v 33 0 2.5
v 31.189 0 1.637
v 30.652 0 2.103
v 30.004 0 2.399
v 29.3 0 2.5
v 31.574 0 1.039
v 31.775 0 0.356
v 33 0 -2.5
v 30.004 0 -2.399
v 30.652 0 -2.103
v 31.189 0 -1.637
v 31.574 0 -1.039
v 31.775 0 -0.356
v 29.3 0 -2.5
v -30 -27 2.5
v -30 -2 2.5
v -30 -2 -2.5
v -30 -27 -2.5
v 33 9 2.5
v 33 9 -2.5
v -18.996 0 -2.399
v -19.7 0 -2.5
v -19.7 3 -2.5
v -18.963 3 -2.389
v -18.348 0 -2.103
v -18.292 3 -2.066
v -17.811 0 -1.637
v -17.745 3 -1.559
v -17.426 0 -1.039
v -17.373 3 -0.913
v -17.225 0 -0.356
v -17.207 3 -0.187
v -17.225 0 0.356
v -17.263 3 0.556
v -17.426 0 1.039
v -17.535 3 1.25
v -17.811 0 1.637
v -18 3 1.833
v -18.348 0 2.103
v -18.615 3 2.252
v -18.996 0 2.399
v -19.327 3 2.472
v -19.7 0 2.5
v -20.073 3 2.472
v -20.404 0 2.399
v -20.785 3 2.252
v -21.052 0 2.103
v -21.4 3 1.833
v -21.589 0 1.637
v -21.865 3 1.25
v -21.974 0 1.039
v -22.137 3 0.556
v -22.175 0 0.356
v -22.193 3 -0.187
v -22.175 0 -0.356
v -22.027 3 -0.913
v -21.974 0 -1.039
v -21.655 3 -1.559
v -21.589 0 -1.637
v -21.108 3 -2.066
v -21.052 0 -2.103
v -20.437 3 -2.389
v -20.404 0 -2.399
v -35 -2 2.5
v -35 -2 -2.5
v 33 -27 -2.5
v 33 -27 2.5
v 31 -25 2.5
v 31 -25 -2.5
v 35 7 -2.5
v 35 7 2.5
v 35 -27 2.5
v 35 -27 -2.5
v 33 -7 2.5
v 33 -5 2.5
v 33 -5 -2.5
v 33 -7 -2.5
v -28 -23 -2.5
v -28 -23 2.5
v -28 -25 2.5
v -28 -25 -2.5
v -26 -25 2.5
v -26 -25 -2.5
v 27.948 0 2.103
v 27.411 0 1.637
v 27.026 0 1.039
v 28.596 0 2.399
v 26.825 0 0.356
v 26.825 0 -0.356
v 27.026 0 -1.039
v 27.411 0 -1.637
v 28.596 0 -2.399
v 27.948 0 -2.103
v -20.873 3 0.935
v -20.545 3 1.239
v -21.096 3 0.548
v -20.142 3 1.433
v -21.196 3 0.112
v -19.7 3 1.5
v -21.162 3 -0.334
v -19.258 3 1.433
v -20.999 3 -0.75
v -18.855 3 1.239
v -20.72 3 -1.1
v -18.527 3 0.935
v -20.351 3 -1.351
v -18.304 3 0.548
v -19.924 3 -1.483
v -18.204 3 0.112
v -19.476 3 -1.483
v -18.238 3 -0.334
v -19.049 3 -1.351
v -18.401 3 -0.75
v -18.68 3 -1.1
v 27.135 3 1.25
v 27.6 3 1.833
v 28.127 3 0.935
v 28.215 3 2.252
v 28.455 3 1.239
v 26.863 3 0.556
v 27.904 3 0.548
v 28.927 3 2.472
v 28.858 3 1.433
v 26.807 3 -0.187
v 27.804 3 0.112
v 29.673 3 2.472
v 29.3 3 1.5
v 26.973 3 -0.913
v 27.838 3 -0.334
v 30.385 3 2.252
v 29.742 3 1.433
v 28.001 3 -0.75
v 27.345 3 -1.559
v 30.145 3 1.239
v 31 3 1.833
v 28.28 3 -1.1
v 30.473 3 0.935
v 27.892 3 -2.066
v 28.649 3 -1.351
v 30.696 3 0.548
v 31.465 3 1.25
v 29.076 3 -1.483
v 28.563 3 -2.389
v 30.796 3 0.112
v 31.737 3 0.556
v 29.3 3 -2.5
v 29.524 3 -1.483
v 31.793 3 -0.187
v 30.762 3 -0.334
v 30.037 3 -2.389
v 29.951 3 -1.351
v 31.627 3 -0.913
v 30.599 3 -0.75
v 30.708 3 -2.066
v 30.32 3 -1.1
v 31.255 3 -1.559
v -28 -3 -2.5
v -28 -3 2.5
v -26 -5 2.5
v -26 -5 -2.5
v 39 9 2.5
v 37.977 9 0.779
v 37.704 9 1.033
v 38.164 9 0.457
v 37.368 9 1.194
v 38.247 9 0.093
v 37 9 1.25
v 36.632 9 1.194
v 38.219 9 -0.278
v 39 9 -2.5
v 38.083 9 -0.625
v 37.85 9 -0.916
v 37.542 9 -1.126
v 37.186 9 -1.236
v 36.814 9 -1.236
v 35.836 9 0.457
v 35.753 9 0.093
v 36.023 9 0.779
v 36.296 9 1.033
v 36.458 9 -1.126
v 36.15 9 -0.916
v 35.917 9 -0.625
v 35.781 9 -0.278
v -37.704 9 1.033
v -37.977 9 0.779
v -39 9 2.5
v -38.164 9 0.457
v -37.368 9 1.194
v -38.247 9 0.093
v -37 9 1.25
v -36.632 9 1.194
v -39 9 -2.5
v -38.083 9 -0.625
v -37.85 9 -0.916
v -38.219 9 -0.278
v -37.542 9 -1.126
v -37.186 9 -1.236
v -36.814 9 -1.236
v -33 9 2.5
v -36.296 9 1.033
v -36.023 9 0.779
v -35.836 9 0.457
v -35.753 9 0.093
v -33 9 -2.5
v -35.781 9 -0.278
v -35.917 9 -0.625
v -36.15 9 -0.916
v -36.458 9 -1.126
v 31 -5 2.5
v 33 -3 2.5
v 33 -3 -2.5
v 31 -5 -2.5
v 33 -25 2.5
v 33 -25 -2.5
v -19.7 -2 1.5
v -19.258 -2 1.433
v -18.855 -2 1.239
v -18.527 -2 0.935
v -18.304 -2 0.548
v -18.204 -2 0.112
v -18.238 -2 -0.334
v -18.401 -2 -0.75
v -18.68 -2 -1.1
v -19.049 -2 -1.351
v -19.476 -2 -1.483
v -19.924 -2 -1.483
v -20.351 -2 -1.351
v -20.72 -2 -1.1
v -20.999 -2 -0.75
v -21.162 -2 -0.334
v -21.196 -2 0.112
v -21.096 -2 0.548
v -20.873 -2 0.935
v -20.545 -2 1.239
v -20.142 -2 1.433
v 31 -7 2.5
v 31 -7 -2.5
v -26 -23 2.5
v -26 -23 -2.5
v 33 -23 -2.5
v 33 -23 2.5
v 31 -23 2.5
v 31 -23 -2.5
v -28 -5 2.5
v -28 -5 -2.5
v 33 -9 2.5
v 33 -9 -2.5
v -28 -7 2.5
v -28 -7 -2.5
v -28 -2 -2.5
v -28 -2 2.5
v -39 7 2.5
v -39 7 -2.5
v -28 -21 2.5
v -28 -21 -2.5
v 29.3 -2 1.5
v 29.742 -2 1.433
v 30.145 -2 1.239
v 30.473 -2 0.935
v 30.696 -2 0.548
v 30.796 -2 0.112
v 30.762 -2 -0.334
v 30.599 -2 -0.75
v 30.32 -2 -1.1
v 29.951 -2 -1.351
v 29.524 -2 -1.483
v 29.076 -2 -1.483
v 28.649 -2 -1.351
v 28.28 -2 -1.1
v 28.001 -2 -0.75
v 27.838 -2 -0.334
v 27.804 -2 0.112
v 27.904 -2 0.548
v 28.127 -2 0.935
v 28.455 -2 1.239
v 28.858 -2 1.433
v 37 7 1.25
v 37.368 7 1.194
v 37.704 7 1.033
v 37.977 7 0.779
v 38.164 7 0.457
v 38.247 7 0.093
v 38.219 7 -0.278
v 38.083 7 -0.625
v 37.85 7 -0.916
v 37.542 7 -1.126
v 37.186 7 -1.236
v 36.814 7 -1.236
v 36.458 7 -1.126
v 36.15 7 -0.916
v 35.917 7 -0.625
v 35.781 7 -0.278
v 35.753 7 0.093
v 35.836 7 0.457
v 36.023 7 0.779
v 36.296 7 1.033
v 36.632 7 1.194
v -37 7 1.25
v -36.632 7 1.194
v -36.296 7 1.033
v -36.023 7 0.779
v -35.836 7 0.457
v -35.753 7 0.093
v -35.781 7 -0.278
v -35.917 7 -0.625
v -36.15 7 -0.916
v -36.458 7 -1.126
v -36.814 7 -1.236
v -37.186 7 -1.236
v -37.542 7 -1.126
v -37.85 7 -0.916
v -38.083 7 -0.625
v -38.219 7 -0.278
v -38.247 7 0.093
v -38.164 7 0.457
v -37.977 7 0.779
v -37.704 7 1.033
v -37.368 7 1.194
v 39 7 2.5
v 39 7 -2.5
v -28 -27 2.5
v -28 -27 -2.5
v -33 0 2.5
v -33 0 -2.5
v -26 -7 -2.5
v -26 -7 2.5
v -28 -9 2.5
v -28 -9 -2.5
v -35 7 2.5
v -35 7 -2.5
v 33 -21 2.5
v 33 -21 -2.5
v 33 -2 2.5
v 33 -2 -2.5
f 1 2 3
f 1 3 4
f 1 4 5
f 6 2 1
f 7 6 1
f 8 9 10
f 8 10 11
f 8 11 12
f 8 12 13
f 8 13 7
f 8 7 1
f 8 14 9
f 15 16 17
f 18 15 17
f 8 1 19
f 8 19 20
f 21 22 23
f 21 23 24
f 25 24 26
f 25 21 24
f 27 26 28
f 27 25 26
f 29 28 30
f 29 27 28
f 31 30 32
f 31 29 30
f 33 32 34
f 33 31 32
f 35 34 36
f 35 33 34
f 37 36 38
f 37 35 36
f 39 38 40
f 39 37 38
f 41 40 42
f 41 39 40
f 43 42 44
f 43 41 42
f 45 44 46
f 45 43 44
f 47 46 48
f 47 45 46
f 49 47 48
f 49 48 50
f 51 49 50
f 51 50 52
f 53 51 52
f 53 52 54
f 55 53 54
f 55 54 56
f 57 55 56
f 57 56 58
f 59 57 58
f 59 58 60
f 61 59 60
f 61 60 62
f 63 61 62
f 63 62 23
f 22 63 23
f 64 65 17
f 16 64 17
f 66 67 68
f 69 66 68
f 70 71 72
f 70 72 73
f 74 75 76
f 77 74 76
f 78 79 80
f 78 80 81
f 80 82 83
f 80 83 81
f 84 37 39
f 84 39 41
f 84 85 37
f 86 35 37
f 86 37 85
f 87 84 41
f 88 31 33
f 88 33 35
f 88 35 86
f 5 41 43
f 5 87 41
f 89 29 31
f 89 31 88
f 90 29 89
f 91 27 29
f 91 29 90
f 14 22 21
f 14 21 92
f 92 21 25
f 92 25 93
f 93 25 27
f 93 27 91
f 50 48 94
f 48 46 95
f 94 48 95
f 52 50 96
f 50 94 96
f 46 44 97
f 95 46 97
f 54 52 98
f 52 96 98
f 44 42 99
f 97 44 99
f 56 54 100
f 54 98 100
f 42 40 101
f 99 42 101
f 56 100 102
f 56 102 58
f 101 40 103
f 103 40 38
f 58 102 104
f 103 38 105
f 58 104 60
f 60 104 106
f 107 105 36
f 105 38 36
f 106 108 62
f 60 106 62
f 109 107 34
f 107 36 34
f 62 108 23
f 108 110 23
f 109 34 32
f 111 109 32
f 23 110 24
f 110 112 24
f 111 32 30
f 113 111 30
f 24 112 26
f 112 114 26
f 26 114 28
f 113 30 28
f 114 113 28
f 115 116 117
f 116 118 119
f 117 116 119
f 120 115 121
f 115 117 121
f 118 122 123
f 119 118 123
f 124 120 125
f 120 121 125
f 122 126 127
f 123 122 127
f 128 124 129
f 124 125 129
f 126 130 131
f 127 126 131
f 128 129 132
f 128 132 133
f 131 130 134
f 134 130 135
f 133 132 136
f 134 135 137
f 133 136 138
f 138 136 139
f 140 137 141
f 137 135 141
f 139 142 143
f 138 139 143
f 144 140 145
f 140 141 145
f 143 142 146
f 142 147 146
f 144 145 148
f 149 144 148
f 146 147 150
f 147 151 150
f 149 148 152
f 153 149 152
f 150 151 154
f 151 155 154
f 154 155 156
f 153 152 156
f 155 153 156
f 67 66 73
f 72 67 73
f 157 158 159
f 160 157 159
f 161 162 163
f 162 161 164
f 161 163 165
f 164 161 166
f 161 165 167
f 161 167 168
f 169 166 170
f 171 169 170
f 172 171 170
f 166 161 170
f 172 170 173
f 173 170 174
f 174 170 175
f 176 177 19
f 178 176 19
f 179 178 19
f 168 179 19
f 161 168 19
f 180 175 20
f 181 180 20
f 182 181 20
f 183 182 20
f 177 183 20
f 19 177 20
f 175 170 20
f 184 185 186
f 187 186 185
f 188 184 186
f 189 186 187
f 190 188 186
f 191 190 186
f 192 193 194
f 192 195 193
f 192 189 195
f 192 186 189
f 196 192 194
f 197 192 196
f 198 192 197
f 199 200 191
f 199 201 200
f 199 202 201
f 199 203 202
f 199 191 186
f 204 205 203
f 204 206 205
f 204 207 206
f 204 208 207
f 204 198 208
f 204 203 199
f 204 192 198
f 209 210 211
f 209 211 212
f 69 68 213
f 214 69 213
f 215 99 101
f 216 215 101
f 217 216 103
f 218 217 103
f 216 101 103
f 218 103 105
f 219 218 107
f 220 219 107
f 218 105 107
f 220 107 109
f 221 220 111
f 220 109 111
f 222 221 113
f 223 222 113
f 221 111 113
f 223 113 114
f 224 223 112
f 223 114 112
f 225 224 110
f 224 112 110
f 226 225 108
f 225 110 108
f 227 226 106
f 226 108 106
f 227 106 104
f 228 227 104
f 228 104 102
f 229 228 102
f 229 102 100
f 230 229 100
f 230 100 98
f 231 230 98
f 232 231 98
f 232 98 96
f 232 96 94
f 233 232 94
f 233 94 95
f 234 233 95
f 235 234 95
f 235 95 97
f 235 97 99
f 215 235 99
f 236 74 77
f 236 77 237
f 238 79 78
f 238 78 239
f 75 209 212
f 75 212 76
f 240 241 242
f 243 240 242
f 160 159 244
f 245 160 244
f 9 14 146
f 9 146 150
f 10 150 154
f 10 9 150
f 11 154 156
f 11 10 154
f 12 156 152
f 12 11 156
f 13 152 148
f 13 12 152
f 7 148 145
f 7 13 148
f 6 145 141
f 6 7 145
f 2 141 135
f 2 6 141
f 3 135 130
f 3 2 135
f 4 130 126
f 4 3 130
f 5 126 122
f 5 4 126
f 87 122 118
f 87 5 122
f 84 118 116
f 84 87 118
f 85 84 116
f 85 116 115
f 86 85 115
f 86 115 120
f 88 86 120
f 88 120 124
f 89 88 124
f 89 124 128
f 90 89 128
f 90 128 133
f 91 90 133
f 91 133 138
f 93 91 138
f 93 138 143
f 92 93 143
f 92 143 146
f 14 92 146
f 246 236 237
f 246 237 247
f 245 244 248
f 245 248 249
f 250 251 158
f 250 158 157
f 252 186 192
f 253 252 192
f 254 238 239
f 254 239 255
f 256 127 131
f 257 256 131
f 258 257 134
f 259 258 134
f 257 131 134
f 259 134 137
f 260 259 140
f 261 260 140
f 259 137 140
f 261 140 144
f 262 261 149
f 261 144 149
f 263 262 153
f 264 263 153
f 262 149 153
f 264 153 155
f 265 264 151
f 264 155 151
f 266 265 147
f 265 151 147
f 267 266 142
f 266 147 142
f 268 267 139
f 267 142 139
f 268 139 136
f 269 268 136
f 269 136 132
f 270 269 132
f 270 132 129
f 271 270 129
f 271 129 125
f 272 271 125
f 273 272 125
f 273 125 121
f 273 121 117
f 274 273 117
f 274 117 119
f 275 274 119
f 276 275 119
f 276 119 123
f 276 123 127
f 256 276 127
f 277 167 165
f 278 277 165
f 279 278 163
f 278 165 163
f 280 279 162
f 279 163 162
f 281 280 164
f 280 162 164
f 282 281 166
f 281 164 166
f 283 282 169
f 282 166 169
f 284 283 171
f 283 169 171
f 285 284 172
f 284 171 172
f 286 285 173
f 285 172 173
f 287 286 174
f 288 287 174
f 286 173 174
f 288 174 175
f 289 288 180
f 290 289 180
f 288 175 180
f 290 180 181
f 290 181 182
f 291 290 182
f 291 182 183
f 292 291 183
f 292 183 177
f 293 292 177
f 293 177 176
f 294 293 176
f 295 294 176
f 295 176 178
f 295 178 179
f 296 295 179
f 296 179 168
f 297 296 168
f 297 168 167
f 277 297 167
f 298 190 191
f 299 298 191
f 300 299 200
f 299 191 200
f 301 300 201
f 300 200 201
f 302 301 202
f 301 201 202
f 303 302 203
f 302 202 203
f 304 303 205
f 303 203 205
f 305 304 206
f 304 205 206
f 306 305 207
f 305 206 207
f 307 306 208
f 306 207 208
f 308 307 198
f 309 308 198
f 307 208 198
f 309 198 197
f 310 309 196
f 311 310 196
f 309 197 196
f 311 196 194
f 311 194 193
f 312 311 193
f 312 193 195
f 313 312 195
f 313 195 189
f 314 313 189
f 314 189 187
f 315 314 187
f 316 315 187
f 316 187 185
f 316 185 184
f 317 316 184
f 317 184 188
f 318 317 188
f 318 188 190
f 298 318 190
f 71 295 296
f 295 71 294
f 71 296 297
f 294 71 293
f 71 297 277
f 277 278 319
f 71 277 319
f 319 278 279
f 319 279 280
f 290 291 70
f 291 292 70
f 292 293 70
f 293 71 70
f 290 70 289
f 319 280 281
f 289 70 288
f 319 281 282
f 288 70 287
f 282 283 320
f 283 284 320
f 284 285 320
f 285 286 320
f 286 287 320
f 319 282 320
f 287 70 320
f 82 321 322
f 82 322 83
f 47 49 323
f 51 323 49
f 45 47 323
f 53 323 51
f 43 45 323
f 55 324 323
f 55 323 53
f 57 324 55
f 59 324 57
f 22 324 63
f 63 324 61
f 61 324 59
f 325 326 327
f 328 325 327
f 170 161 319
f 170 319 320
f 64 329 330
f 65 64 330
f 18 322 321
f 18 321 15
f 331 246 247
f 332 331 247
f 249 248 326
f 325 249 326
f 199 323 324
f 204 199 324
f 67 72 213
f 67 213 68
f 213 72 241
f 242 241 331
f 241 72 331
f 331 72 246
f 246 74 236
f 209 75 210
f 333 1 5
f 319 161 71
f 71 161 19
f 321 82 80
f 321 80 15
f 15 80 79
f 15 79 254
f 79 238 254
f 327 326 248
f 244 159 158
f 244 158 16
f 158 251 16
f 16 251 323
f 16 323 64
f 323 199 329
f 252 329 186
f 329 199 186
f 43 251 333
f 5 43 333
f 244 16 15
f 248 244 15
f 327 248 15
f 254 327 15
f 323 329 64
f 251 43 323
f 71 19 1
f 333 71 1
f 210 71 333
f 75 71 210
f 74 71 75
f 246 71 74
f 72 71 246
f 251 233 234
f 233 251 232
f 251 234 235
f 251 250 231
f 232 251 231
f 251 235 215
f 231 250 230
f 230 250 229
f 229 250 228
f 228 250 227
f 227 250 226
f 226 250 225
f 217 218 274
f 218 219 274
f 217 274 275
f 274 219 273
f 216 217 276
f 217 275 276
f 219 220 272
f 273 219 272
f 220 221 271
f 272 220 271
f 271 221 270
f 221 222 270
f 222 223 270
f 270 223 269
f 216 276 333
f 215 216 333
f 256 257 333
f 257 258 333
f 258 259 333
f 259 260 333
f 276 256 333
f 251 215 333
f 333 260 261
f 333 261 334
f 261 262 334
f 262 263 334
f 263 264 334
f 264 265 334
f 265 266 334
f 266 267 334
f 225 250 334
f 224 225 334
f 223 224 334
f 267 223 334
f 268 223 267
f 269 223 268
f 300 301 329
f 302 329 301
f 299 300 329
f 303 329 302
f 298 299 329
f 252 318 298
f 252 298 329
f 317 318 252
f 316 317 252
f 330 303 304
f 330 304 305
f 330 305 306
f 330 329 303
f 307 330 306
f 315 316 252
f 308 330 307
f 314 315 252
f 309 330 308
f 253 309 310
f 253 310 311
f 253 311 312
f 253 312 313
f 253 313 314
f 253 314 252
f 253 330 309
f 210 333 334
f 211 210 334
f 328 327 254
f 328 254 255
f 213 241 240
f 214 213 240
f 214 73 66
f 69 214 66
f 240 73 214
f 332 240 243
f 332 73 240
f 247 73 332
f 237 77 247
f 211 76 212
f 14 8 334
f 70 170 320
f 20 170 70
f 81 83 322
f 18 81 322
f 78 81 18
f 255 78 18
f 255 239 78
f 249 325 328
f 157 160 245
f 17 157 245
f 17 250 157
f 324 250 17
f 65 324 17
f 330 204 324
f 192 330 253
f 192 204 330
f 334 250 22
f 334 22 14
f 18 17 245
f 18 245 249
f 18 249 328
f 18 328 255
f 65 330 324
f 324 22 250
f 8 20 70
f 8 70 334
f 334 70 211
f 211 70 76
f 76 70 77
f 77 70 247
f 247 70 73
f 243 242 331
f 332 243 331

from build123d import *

# Parameters (mm, degrees)
SKETCH1_W           = 66
SKETCH1_H           = 5
BASE_FLANGE1_DEPTH  = 2
SKETCH2_R           = 2.5
BOSS_EXTRUDE1_DEPTH = 3
SKETCH3_W           = 2
SKETCH3_H           = 5
BOSS_EXTRUDE2_DEPTH = 11
SKETCH4_W           = 6
SKETCH4_H           = 5
BOSS_EXTRUDE3_DEPTH = 2
SKETCH5_R           = 1.5
CUT_EXTRUDE1_DEPTH  = 40.537956447
SKETCH6_R           = 1.25
CUT_EXTRUDE2_DEPTH  = 41.598645298
SKETCH7_W           = 2
SKETCH7_H           = 5
BOSS_EXTRUDE4_DEPTH = 25
BOSS_EXTRUDE5_DEPTH = 5


# Sheet-metal steps are written as plain solids
with BuildPart() as part:
    # Sketch1 → Base-Flange1 (new body)
    with BuildSketch(Plane(origin=(0, 0, 0), x_dir=(1, 0, 0), z_dir=(0, 1, 0))):
        Rectangle(SKETCH1_W, SKETCH1_H)
    extrude(amount=-BASE_FLANGE1_DEPTH)

    # Sketch2 → Boss-Extrude1 (add)
    with BuildSketch(Plane(origin=(0, 0, 0), x_dir=(-1, 0, 0), z_dir=(0, -1, 0))):
        with Locations(Location((19.7, 0, 0), (0, 0, 90))):
            Circle(SKETCH2_R)
        with Locations(Location((-29.3, 0, 0), (0, 0, 90))):
            Circle(SKETCH2_R)
    extrude(amount=-BOSS_EXTRUDE1_DEPTH)

    # Sketch3 → Boss-Extrude2 (add)
    with BuildSketch(Plane(origin=(0, -2, 0), x_dir=(-1, 0, 0), z_dir=(0, -1, 0))):
        with Locations((-34, 0)):
            Rectangle(SKETCH3_W, SKETCH3_H)
    boss_extrude2 = extrude(amount=-BOSS_EXTRUDE2_DEPTH)

    # Sketch4 → Boss-Extrude3 (add)
    with BuildSketch(Plane(origin=(0, 9, 0), x_dir=(1, 0, 0), z_dir=(0, 1, 0))):
        with Locations((36, 0)):
            Rectangle(SKETCH4_W, SKETCH4_H)
    boss_extrude3 = extrude(amount=-BOSS_EXTRUDE3_DEPTH)

    # Mirror1: Boss-Extrude2, Boss-Extrude3 across plane
    add(boss_extrude2.mirror(Plane(origin=(0, 0, 0), x_dir=(0, 0, 1), z_dir=(1, 0, 0))))
    add(boss_extrude3.mirror(Plane(origin=(0, 0, 0), x_dir=(0, 0, 1), z_dir=(1, 0, 0))))

    # Sketch5 → Cut-Extrude1 (cut, through all)
    with BuildSketch(Plane(origin=(0, 3, 0), x_dir=(1, 0, 0), z_dir=(0, 1, 0))):
        with Locations(Location((-19.7, 0, 0), (0, 0, 270))):
            Circle(SKETCH5_R)
        with Locations(Location((29.3, 0, 0), (0, 0, 270))):
            Circle(SKETCH5_R)
    extrude(amount=-CUT_EXTRUDE1_DEPTH, mode=Mode.SUBTRACT)

    # Sketch6 → Cut-Extrude2 (cut, through all)
    with BuildSketch(Plane(origin=(0, 9, 0), x_dir=(1, 0, 0), z_dir=(0, 1, 0))):
        with Locations(Location((-37, 0, 0), (0, 0, 270))):
            Circle(SKETCH6_R)
        with Locations(Location((37, 0, 0), (0, 0, 270))):
            Circle(SKETCH6_R)
    extrude(amount=-CUT_EXTRUDE2_DEPTH, mode=Mode.SUBTRACT)

    # Sketch7 → Boss-Extrude4 (add)
    with BuildSketch(Plane(origin=(0, -2, 0), x_dir=(-1, 0, 0), z_dir=(0, -1, 0))):
        with Locations((29, 0)):
            Rectangle(SKETCH7_W, SKETCH7_H)
    boss_extrude4 = extrude(amount=BOSS_EXTRUDE4_DEPTH)

    # Sketch8 → Boss-Extrude5 (add)
    with BuildSketch(Plane.XY.offset(2.5)):
        Polygon((-28, -3), (-26, -5), (-28, -5), align=None)
        Polygon((-28, -7), (-26, -7), (-28, -9), align=None)
        Polygon((-28, -21), (-28, -23), (-26, -23), align=None)
        Polygon((-28, -25), (-28, -27), (-26, -25), align=None)
    boss_extrude5 = extrude(amount=-BOSS_EXTRUDE5_DEPTH)

    # Mirror2: Boss-Extrude4, Boss-Extrude5 across plane
    add(boss_extrude4.mirror(Plane(origin=(2.5, 0, 0), x_dir=(0, 0, 1), z_dir=(1, 0, 0))))
    add(boss_extrude5.mirror(Plane(origin=(2.5, 0, 0), x_dir=(0, 0, 1), z_dir=(1, 0, 0))))


solid = part.part
